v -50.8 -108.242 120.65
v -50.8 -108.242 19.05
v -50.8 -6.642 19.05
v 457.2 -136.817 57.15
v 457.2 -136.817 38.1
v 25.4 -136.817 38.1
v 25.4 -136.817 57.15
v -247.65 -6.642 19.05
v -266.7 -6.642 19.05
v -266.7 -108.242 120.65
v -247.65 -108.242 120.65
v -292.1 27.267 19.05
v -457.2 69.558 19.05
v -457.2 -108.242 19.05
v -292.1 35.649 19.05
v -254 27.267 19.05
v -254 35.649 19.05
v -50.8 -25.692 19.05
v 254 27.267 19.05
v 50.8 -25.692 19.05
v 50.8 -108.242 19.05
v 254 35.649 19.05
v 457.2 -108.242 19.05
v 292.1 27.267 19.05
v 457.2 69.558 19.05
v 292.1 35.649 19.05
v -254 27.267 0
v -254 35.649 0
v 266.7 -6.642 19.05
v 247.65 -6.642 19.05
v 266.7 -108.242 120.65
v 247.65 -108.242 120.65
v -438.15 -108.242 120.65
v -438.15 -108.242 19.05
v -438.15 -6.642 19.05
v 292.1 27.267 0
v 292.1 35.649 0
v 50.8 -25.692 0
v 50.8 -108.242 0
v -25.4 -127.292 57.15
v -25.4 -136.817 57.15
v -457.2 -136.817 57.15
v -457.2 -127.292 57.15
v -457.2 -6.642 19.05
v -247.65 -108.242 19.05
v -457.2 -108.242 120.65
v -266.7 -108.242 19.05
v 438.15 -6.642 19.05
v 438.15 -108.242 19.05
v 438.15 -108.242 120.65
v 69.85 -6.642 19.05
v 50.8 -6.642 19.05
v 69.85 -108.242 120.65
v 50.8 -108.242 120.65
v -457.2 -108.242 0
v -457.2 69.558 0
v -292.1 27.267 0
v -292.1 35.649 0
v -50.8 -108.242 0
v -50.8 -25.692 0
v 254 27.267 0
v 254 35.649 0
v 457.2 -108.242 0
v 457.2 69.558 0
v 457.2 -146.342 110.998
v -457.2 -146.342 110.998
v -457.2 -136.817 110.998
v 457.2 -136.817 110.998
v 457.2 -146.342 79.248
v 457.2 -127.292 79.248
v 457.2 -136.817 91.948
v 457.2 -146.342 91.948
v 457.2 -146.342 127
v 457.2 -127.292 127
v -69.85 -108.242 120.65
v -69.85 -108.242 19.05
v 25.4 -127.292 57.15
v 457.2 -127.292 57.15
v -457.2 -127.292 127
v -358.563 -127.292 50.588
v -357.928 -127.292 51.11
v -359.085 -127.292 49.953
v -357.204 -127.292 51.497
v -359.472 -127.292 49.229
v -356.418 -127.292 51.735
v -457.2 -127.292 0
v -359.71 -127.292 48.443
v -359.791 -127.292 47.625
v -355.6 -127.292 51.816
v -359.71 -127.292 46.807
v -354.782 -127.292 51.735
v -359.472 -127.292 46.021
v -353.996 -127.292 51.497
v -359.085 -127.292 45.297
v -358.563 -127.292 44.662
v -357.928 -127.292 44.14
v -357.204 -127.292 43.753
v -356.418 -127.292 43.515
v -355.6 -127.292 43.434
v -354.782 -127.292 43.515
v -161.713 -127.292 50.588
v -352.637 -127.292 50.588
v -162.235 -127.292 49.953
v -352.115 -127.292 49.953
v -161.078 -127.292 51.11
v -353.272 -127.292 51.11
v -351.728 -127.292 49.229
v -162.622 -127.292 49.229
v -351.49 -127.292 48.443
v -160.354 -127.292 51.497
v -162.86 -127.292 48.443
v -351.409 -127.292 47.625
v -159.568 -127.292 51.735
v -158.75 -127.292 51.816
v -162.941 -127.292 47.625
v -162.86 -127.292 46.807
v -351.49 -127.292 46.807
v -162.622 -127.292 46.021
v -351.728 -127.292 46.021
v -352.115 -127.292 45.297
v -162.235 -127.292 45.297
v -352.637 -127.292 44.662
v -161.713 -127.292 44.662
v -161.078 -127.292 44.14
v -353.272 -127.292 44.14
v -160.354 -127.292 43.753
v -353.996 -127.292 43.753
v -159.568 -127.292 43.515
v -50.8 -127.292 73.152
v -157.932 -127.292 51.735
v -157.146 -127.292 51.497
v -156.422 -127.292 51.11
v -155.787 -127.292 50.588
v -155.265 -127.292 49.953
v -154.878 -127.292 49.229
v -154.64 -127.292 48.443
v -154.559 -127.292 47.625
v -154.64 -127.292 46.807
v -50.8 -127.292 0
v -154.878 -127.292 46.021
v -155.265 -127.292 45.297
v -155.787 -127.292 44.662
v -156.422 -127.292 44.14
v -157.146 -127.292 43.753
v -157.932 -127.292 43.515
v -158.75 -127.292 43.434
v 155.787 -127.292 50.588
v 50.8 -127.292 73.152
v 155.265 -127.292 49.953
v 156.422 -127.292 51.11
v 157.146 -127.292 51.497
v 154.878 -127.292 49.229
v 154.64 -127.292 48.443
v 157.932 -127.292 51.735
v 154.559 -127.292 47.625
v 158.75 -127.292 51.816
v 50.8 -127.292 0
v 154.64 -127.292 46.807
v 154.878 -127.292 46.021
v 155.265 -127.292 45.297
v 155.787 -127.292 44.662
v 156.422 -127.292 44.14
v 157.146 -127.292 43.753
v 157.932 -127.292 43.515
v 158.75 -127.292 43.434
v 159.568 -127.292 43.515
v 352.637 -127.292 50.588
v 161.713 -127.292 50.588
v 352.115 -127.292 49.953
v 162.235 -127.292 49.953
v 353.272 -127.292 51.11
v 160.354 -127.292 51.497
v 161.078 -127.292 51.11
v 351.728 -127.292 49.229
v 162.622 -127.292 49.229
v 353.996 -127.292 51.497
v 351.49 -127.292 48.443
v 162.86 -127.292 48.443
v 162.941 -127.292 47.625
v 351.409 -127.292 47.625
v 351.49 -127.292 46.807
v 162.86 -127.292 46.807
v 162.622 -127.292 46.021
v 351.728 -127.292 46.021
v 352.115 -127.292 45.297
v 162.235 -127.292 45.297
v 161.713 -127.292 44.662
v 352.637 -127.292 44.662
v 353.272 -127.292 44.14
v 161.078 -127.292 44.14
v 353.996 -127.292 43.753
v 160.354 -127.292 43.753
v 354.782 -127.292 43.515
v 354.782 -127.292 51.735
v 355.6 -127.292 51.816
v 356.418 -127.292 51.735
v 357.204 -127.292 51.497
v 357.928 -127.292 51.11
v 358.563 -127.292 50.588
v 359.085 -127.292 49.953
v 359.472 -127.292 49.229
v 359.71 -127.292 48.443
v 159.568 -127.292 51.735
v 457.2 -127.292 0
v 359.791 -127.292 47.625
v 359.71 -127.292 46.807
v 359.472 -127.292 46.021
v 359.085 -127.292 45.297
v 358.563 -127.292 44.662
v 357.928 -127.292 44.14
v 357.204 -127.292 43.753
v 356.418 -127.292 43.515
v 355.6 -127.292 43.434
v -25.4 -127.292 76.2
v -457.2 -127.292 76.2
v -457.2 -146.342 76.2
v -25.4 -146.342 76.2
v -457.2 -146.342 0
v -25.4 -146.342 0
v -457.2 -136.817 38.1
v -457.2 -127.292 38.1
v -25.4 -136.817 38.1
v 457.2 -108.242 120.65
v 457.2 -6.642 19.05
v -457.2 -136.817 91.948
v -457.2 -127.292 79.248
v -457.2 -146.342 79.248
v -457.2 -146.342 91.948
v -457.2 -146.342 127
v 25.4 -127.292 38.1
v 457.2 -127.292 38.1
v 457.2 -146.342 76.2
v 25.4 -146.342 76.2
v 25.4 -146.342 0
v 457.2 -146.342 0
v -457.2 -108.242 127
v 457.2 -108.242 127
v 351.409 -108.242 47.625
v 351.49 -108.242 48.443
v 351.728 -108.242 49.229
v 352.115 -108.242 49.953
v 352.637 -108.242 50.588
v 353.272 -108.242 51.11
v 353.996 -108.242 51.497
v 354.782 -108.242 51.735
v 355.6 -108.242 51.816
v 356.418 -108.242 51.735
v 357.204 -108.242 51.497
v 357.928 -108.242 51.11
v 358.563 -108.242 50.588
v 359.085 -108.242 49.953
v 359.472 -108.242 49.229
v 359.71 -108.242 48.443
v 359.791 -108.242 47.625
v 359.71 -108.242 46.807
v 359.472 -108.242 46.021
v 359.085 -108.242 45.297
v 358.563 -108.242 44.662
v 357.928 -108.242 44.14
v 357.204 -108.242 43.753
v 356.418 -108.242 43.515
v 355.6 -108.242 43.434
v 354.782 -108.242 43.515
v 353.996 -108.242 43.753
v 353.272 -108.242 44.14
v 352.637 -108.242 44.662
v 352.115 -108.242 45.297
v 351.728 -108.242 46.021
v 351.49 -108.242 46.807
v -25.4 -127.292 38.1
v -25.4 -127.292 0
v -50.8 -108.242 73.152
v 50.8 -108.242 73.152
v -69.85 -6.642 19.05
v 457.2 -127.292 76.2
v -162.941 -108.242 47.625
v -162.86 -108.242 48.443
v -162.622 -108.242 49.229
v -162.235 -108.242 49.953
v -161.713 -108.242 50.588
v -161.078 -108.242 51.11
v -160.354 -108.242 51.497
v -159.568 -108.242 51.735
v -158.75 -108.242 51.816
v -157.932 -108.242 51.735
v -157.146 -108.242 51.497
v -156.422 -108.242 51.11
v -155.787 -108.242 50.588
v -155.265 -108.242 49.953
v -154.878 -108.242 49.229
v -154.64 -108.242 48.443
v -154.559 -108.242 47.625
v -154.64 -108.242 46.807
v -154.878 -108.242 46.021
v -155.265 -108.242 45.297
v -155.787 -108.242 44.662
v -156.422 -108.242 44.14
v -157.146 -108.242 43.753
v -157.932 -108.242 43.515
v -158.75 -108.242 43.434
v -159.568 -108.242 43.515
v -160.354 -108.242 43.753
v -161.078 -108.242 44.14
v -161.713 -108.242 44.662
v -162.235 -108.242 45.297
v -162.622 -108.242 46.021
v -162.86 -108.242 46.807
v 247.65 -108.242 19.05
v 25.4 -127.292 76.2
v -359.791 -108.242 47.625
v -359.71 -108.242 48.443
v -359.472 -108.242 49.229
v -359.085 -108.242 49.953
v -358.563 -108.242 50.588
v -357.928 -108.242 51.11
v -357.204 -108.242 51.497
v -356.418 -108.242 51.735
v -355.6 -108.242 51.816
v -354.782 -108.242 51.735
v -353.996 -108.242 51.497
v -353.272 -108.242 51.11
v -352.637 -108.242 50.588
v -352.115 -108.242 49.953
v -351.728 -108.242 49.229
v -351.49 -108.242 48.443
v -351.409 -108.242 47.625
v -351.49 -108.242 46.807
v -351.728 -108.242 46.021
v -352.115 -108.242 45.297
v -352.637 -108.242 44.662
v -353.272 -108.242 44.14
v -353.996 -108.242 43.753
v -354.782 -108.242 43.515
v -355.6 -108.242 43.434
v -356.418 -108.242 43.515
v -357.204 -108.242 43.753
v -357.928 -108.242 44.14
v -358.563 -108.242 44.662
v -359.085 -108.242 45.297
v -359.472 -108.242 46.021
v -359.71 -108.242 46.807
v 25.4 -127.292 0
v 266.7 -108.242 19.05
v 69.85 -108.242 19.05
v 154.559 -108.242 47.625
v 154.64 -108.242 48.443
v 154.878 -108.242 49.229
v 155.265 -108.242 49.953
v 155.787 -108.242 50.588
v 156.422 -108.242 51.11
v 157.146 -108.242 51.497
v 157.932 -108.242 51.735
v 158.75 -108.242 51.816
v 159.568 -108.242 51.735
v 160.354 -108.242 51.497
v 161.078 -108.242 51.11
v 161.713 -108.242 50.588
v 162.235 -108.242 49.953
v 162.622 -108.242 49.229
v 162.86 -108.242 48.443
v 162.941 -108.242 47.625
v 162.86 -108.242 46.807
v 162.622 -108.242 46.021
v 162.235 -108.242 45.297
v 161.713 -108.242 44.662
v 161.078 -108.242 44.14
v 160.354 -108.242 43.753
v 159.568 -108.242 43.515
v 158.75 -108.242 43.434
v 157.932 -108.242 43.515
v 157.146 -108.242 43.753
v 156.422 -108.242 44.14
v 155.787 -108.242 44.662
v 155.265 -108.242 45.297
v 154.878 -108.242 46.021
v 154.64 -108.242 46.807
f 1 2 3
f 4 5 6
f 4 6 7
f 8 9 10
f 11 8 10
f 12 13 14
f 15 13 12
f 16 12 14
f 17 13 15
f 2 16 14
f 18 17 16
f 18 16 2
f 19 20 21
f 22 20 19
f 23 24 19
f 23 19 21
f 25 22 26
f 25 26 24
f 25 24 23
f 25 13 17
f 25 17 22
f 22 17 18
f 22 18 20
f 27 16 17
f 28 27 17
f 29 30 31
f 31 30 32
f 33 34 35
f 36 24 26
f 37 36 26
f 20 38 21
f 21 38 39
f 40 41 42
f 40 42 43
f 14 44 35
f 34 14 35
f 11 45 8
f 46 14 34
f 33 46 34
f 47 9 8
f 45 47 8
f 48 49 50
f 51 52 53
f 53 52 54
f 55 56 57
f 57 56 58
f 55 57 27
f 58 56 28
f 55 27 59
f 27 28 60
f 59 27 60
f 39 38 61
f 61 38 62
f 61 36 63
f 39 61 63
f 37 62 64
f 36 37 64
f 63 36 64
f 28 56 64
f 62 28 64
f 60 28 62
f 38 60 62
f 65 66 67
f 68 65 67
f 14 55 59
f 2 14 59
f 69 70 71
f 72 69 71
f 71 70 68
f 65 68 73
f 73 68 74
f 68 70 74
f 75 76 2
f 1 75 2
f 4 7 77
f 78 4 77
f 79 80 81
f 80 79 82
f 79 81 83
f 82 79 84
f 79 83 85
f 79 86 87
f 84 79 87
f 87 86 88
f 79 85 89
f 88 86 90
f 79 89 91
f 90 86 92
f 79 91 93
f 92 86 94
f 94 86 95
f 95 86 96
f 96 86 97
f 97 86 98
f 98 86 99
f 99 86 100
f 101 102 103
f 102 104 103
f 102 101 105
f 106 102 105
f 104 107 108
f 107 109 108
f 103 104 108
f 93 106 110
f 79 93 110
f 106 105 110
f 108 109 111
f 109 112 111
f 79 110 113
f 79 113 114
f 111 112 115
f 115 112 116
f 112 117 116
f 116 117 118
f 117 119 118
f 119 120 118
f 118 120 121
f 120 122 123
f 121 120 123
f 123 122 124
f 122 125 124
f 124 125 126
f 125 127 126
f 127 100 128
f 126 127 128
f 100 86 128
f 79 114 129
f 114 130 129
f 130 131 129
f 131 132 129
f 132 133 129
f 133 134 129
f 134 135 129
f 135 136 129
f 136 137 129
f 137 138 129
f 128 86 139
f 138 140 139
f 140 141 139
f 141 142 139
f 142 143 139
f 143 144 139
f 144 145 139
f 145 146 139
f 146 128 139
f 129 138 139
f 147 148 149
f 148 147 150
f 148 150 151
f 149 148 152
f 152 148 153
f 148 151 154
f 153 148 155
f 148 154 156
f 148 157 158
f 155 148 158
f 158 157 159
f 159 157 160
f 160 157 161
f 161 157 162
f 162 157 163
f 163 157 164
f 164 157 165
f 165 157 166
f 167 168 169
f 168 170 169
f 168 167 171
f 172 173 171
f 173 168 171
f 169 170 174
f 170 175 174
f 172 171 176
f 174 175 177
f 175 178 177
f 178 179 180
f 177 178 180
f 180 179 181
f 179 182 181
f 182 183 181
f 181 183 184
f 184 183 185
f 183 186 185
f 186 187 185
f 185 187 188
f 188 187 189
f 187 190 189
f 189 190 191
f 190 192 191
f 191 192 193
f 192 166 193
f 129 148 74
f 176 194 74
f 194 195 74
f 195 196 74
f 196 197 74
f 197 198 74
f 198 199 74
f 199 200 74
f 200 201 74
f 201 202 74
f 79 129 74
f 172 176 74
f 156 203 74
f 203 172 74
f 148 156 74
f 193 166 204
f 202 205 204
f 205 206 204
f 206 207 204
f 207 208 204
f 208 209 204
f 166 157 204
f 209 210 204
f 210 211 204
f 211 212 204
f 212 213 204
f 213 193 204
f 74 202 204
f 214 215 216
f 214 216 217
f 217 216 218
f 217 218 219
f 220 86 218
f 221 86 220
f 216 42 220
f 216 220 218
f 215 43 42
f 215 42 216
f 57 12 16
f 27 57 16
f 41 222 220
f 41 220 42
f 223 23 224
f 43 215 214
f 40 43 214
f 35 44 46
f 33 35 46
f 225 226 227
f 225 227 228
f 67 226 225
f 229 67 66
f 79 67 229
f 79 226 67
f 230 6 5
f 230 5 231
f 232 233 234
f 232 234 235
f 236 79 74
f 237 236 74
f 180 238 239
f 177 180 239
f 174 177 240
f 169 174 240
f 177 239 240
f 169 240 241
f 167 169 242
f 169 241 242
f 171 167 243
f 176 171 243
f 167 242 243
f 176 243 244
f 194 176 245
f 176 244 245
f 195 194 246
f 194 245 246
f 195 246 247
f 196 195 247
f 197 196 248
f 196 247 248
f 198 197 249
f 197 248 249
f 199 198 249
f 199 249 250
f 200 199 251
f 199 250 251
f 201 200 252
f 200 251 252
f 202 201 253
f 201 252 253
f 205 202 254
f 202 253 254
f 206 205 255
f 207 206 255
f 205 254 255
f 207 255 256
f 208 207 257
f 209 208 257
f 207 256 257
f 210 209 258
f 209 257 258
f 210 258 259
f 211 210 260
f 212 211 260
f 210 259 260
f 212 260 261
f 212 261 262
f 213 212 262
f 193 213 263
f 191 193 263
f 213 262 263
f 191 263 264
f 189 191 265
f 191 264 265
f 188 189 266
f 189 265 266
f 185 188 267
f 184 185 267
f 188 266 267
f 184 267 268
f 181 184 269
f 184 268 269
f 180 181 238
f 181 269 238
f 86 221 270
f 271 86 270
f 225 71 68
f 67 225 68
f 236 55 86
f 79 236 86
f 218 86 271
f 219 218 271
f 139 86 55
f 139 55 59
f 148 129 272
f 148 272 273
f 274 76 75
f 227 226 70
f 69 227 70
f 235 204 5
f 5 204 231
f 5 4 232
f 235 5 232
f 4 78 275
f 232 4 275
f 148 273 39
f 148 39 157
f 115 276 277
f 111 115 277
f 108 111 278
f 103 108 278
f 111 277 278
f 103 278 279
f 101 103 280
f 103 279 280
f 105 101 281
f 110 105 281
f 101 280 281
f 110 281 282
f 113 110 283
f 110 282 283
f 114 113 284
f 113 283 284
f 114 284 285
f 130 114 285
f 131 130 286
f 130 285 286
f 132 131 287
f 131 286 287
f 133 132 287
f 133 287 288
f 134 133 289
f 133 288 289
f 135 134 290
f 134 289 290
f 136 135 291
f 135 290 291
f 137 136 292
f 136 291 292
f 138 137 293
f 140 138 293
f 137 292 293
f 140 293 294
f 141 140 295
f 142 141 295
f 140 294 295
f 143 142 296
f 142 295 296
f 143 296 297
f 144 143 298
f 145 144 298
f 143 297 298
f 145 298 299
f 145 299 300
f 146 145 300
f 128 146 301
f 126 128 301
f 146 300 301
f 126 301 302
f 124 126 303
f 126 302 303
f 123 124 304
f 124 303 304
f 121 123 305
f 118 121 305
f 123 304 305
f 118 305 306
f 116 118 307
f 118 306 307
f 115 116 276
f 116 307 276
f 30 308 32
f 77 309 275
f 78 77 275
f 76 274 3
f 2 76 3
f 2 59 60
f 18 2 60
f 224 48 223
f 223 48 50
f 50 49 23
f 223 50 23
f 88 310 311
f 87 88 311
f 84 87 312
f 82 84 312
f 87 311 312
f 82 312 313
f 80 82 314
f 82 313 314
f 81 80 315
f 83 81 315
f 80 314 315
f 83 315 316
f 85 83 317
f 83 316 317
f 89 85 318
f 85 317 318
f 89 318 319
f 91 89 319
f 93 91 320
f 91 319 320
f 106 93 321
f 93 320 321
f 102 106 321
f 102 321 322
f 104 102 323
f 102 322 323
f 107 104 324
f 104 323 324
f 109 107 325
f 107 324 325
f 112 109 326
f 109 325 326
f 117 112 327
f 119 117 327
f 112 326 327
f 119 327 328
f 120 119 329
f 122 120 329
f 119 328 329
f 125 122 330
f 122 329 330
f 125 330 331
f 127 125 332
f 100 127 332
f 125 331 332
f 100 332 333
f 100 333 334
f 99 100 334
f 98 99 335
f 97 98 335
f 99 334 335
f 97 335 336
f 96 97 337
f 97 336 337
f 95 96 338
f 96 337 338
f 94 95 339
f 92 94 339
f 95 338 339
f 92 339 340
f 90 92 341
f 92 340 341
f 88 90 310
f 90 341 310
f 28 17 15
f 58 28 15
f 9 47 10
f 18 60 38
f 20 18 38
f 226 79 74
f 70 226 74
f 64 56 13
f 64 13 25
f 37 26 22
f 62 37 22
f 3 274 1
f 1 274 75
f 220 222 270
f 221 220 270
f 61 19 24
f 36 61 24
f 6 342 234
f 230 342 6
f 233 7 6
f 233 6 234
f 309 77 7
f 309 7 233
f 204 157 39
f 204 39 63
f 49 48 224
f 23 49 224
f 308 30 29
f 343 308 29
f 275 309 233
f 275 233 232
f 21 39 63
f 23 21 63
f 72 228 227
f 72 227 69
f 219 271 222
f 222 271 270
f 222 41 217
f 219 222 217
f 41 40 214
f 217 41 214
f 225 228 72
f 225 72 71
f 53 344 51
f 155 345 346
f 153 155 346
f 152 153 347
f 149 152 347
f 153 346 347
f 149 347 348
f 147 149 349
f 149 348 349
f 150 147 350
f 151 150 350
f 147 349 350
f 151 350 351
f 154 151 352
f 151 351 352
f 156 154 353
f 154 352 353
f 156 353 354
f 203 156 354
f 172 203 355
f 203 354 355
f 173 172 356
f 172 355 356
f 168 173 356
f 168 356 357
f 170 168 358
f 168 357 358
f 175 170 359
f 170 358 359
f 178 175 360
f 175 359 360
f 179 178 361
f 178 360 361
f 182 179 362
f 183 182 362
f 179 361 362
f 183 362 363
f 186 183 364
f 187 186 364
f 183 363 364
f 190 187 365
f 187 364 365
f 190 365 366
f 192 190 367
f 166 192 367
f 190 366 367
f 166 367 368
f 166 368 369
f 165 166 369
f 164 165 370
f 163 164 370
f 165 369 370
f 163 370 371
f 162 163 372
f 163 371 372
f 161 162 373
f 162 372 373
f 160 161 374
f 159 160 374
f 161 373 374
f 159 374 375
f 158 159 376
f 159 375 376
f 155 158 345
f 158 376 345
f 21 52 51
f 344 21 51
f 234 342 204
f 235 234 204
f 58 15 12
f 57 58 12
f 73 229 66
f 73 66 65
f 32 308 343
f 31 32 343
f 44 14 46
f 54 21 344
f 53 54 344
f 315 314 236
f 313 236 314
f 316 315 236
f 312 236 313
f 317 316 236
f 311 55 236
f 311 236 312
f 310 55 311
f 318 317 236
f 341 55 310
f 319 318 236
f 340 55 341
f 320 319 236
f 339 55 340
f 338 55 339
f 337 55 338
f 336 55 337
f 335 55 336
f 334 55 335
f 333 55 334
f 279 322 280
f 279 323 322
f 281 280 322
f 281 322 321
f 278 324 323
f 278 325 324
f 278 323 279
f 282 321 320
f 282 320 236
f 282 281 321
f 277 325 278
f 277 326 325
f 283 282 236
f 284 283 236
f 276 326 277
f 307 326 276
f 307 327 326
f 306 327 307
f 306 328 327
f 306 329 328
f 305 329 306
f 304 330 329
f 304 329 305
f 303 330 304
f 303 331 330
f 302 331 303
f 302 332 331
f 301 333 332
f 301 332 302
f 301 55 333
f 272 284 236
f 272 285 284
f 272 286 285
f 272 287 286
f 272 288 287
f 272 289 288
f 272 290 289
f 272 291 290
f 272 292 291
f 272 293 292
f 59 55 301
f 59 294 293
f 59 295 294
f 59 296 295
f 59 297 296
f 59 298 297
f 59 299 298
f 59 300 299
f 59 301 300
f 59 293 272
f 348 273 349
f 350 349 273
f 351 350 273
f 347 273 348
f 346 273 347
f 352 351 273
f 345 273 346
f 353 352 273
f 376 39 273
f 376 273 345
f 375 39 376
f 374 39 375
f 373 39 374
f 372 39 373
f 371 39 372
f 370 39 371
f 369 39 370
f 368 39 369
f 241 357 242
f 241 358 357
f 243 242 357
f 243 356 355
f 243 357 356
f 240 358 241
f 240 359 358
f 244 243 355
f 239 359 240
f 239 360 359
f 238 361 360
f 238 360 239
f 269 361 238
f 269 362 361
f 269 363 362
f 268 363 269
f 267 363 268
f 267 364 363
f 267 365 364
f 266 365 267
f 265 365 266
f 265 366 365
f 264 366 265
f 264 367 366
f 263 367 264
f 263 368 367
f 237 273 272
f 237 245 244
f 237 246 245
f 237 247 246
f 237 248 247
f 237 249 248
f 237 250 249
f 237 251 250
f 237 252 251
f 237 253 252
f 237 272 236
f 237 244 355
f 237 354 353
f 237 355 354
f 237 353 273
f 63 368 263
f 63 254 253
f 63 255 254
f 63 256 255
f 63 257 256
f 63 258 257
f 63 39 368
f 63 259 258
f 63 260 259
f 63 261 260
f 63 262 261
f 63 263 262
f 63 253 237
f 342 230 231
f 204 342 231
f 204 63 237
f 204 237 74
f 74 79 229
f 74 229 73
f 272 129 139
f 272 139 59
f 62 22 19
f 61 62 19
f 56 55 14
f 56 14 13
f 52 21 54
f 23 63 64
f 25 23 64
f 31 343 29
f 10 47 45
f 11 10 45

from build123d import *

# Parameters (mm, degrees)
F0_W      = 914.4
F0_H      = 177.8
F1_DEPTH  = 19.05
F2_W      = 914.4
F2_H      = 19.05
F3_DEPTH  = 127
F4_W      = 431.8
F4_H      = 76.2
F5_DEPTH  = 19.05
F6_W      = 914.4
F6_H      = 47.752
F7_DEPTH  = 19.05
F8_W      = 9.525
F8_H      = 19.05
F9_DEPTH  = 914.4
F10_W     = 19.05
F10_H     = 101.6
F11_DEPTH = 101.6
F13_DEPTH = 914.4
F14_W     = 101.6
F14_H     = 82.55
F14_H_2   = 19.05
F15_DEPTH = 73.152
F16_W     = 9.525
F16_H     = 19.05
F17_DEPTH = 914.4
F18_R     = 4.191
F19_DEPTH = 19.05
F21_DEPTH = 19.05


# Not quite as in the source:
# - a feature names something its author has since deleted; it is built from what else it names


with BuildPart() as f1:
    # F0 (on Top) → F1 (new body)
    with BuildSketch(Plane.XY):
        with Locations((0, -19.3418145372)):
            Rectangle(F0_W, F0_H)
    extrude(amount=F1_DEPTH)


with BuildPart() as f3:
    # F2 (on face) → F3 (new body)
    with BuildSketch(Plane(origin=(0, 0, 0), x_dir=(1, 0, 0), z_dir=(0, 0, -1))):
        with Locations((0, 117.7668145372)):
            Rectangle(F2_W, F2_H)
    extrude(amount=-F3_DEPTH)


with BuildPart() as f5:
    # F4 (on face) → F5 (new body)
    with BuildSketch(Plane.XZ.offset(127.2918145372)):
        with Locations((-241.3, 38.1)):
            Rectangle(F4_W, F4_H)
    extrude(amount=F5_DEPTH)


with BuildPart() as f5b:
    # F4 (on face) → F5, piece 2 (new body)
    with BuildSketch(Plane.XZ.offset(127.2918145372)):
        with Locations((241.3, 38.1)):
            Rectangle(F4_W, F4_H)
    extrude(amount=F5_DEPTH)


with BuildPart() as f7:
    # F6 (on face) → F7 (new body)
    with BuildSketch(Plane.XZ.offset(127.2918145372)):
        with Locations((0, 103.124)):
            Rectangle(F6_W, F6_H)
    extrude(amount=F7_DEPTH)

    # F8 (on face) → F9 (cut, through all)
    with BuildSketch(Plane.YZ.offset(457.2)):
        with Locations((-141.5793145372, 101.473)):
            Rectangle(F8_W, F8_H)
    extrude(amount=-F9_DEPTH, mode=Mode.SUBTRACT)


with BuildPart() as f11:
    # F10 (on face) → F11 (new body)
    with BuildSketch(Plane.XY.offset(19.05)):
        with Locations((-447.675, -57.4418145372)):
            Rectangle(F10_W, F10_H)
    extrude(amount=F11_DEPTH)


with BuildPart() as f11b:
    # F10 (on face) → F11, piece 2 (new body)
    with BuildSketch(Plane.XY.offset(19.05)):
        with Locations((-257.175, -57.4418145372)):
            Rectangle(F10_W, F10_H)
    extrude(amount=F11_DEPTH)


with BuildPart() as f11c:
    # F10 (on face) → F11, piece 3 (new body)
    with BuildSketch(Plane.XY.offset(19.05)):
        with Locations((-60.325, -57.4418145372)):
            Rectangle(F10_W, F10_H)
    extrude(amount=F11_DEPTH)


with BuildPart() as f11d:
    # F10 (on face) → F11, piece 4 (new body)
    with BuildSketch(Plane.XY.offset(19.05)):
        with Locations((60.325, -57.4418145372)):
            Rectangle(F10_W, F10_H)
    extrude(amount=F11_DEPTH)


with BuildPart() as f11e:
    # F10 (on face) → F11, piece 5 (new body)
    with BuildSketch(Plane.XY.offset(19.05)):
        with Locations((257.175, -57.4418145372)):
            Rectangle(F10_W, F10_H)
    extrude(amount=F11_DEPTH)


with BuildPart() as f11f:
    # F10 (on face) → F11, piece 6 (new body)
    with BuildSketch(Plane.XY.offset(19.05)):
        with Locations((447.675, -57.4418145372)):
            Rectangle(F10_W, F10_H)
    extrude(amount=F11_DEPTH)


with BuildPart() as f13_tool:
    # F12 (on face) → F13 (new body, through all)
    with BuildSketch(Plane(origin=(-457.2, 0, 0), x_dir=(0, -1, 0), z_dir=(-1, 0, 0))):
        Polygon((6.6418145372, 120.65), (6.6418145372, 19.05), (108.2418145372, 120.65), align=None)
    extrude(amount=-F13_DEPTH)


with BuildPart() as f11_1:
    add(f11.part)

    # F13: cut by f13_tool
    add(f13_tool.part, mode=Mode.SUBTRACT)


with BuildPart() as f11b_1:
    add(f11b.part)

    # F13: cut by f13_tool
    add(f13_tool.part, mode=Mode.SUBTRACT)


with BuildPart() as f11c_1:
    add(f11c.part)

    # F13: cut by f13_tool
    add(f13_tool.part, mode=Mode.SUBTRACT)


with BuildPart() as f11d_1:
    add(f11d.part)

    # F13: cut by f13_tool
    add(f13_tool.part, mode=Mode.SUBTRACT)


with BuildPart() as f11e_1:
    add(f11e.part)

    # F13: cut by f13_tool
    add(f13_tool.part, mode=Mode.SUBTRACT)


with BuildPart() as f11f_1:
    add(f11f.part)

    # F13: cut by f13_tool
    add(f13_tool.part, mode=Mode.SUBTRACT)


with BuildPart() as f15_tool:
    # F14 (on face) → F15 (new body)
    with BuildSketch(Plane(origin=(0, 0, 0), x_dir=(1, 0, 0), z_dir=(0, 0, -1))):
        with Locations((0, 66.9668145372)):
            Rectangle(F14_W, F14_H)
        with Locations((0, 117.7668145372)):
            Rectangle(F14_W, F14_H_2)
    extrude(amount=-F15_DEPTH)


with BuildPart() as f1_1:
    add(f1.part)

    # F15: cut by f15_tool
    add(f15_tool.part, mode=Mode.SUBTRACT)

    # F20 (on face) → F21 (cut, through all)
    with BuildSketch(Plane.XY.offset(19.05)):
        Polygon((-254, 35.6491854628), (-273.05, 35.6491854628), (-292.1, 35.6491854628), (-292.1, 27.2671854628), (-254, 27.2671854628), align=None)
        Polygon((292.1, 35.6491854628), (273.05, 35.6491854628), (254, 35.6491854628), (254, 27.2671854628), (292.1, 27.2671854628), align=None)
    extrude(amount=-F21_DEPTH, mode=Mode.SUBTRACT)


with BuildPart() as f3_1:
    add(f3.part)

    # F15: cut by f15_tool
    add(f15_tool.part, mode=Mode.SUBTRACT)

    # F18 (on face) → F19 (cut)
    with BuildSketch(Plane(origin=(0, -108.2418145372, 0), x_dir=(-1, 0, 0), z_dir=(0, 1, 0))):
        with Locations((-355.6, 47.625)):
            Circle(F18_R)
        with Locations((158.75, 47.625)):
            Circle(F18_R)
        with Locations((355.6, 47.625)):
            Circle(F18_R)
        with Locations((-158.75, 47.625)):
            Circle(F18_R)
    extrude(amount=-F19_DEPTH, mode=Mode.SUBTRACT)


with BuildPart() as f17_tool:
    # F16 (on face) → F17 (new body, through all)
    with BuildSketch(Plane.YZ.offset(457.2)):
        with Locations((-132.0543145372, 47.625)):
            Rectangle(F16_W, F16_H)
    extrude(amount=-F17_DEPTH)


with BuildPart() as f5_1:
    add(f5.part)

    # F17: cut by f17_tool
    add(f17_tool.part, mode=Mode.SUBTRACT)


with BuildPart() as f5b_1:
    add(f5b.part)

    # F17: cut by f17_tool
    add(f17_tool.part, mode=Mode.SUBTRACT)


solid = Compound([f7.part, f11_1.part, f11b_1.part, f11c_1.part, f11d_1.part, f11e_1.part, f11f_1.part, f1_1.part, f3_1.part, f5_1.part, f5b_1.part])
